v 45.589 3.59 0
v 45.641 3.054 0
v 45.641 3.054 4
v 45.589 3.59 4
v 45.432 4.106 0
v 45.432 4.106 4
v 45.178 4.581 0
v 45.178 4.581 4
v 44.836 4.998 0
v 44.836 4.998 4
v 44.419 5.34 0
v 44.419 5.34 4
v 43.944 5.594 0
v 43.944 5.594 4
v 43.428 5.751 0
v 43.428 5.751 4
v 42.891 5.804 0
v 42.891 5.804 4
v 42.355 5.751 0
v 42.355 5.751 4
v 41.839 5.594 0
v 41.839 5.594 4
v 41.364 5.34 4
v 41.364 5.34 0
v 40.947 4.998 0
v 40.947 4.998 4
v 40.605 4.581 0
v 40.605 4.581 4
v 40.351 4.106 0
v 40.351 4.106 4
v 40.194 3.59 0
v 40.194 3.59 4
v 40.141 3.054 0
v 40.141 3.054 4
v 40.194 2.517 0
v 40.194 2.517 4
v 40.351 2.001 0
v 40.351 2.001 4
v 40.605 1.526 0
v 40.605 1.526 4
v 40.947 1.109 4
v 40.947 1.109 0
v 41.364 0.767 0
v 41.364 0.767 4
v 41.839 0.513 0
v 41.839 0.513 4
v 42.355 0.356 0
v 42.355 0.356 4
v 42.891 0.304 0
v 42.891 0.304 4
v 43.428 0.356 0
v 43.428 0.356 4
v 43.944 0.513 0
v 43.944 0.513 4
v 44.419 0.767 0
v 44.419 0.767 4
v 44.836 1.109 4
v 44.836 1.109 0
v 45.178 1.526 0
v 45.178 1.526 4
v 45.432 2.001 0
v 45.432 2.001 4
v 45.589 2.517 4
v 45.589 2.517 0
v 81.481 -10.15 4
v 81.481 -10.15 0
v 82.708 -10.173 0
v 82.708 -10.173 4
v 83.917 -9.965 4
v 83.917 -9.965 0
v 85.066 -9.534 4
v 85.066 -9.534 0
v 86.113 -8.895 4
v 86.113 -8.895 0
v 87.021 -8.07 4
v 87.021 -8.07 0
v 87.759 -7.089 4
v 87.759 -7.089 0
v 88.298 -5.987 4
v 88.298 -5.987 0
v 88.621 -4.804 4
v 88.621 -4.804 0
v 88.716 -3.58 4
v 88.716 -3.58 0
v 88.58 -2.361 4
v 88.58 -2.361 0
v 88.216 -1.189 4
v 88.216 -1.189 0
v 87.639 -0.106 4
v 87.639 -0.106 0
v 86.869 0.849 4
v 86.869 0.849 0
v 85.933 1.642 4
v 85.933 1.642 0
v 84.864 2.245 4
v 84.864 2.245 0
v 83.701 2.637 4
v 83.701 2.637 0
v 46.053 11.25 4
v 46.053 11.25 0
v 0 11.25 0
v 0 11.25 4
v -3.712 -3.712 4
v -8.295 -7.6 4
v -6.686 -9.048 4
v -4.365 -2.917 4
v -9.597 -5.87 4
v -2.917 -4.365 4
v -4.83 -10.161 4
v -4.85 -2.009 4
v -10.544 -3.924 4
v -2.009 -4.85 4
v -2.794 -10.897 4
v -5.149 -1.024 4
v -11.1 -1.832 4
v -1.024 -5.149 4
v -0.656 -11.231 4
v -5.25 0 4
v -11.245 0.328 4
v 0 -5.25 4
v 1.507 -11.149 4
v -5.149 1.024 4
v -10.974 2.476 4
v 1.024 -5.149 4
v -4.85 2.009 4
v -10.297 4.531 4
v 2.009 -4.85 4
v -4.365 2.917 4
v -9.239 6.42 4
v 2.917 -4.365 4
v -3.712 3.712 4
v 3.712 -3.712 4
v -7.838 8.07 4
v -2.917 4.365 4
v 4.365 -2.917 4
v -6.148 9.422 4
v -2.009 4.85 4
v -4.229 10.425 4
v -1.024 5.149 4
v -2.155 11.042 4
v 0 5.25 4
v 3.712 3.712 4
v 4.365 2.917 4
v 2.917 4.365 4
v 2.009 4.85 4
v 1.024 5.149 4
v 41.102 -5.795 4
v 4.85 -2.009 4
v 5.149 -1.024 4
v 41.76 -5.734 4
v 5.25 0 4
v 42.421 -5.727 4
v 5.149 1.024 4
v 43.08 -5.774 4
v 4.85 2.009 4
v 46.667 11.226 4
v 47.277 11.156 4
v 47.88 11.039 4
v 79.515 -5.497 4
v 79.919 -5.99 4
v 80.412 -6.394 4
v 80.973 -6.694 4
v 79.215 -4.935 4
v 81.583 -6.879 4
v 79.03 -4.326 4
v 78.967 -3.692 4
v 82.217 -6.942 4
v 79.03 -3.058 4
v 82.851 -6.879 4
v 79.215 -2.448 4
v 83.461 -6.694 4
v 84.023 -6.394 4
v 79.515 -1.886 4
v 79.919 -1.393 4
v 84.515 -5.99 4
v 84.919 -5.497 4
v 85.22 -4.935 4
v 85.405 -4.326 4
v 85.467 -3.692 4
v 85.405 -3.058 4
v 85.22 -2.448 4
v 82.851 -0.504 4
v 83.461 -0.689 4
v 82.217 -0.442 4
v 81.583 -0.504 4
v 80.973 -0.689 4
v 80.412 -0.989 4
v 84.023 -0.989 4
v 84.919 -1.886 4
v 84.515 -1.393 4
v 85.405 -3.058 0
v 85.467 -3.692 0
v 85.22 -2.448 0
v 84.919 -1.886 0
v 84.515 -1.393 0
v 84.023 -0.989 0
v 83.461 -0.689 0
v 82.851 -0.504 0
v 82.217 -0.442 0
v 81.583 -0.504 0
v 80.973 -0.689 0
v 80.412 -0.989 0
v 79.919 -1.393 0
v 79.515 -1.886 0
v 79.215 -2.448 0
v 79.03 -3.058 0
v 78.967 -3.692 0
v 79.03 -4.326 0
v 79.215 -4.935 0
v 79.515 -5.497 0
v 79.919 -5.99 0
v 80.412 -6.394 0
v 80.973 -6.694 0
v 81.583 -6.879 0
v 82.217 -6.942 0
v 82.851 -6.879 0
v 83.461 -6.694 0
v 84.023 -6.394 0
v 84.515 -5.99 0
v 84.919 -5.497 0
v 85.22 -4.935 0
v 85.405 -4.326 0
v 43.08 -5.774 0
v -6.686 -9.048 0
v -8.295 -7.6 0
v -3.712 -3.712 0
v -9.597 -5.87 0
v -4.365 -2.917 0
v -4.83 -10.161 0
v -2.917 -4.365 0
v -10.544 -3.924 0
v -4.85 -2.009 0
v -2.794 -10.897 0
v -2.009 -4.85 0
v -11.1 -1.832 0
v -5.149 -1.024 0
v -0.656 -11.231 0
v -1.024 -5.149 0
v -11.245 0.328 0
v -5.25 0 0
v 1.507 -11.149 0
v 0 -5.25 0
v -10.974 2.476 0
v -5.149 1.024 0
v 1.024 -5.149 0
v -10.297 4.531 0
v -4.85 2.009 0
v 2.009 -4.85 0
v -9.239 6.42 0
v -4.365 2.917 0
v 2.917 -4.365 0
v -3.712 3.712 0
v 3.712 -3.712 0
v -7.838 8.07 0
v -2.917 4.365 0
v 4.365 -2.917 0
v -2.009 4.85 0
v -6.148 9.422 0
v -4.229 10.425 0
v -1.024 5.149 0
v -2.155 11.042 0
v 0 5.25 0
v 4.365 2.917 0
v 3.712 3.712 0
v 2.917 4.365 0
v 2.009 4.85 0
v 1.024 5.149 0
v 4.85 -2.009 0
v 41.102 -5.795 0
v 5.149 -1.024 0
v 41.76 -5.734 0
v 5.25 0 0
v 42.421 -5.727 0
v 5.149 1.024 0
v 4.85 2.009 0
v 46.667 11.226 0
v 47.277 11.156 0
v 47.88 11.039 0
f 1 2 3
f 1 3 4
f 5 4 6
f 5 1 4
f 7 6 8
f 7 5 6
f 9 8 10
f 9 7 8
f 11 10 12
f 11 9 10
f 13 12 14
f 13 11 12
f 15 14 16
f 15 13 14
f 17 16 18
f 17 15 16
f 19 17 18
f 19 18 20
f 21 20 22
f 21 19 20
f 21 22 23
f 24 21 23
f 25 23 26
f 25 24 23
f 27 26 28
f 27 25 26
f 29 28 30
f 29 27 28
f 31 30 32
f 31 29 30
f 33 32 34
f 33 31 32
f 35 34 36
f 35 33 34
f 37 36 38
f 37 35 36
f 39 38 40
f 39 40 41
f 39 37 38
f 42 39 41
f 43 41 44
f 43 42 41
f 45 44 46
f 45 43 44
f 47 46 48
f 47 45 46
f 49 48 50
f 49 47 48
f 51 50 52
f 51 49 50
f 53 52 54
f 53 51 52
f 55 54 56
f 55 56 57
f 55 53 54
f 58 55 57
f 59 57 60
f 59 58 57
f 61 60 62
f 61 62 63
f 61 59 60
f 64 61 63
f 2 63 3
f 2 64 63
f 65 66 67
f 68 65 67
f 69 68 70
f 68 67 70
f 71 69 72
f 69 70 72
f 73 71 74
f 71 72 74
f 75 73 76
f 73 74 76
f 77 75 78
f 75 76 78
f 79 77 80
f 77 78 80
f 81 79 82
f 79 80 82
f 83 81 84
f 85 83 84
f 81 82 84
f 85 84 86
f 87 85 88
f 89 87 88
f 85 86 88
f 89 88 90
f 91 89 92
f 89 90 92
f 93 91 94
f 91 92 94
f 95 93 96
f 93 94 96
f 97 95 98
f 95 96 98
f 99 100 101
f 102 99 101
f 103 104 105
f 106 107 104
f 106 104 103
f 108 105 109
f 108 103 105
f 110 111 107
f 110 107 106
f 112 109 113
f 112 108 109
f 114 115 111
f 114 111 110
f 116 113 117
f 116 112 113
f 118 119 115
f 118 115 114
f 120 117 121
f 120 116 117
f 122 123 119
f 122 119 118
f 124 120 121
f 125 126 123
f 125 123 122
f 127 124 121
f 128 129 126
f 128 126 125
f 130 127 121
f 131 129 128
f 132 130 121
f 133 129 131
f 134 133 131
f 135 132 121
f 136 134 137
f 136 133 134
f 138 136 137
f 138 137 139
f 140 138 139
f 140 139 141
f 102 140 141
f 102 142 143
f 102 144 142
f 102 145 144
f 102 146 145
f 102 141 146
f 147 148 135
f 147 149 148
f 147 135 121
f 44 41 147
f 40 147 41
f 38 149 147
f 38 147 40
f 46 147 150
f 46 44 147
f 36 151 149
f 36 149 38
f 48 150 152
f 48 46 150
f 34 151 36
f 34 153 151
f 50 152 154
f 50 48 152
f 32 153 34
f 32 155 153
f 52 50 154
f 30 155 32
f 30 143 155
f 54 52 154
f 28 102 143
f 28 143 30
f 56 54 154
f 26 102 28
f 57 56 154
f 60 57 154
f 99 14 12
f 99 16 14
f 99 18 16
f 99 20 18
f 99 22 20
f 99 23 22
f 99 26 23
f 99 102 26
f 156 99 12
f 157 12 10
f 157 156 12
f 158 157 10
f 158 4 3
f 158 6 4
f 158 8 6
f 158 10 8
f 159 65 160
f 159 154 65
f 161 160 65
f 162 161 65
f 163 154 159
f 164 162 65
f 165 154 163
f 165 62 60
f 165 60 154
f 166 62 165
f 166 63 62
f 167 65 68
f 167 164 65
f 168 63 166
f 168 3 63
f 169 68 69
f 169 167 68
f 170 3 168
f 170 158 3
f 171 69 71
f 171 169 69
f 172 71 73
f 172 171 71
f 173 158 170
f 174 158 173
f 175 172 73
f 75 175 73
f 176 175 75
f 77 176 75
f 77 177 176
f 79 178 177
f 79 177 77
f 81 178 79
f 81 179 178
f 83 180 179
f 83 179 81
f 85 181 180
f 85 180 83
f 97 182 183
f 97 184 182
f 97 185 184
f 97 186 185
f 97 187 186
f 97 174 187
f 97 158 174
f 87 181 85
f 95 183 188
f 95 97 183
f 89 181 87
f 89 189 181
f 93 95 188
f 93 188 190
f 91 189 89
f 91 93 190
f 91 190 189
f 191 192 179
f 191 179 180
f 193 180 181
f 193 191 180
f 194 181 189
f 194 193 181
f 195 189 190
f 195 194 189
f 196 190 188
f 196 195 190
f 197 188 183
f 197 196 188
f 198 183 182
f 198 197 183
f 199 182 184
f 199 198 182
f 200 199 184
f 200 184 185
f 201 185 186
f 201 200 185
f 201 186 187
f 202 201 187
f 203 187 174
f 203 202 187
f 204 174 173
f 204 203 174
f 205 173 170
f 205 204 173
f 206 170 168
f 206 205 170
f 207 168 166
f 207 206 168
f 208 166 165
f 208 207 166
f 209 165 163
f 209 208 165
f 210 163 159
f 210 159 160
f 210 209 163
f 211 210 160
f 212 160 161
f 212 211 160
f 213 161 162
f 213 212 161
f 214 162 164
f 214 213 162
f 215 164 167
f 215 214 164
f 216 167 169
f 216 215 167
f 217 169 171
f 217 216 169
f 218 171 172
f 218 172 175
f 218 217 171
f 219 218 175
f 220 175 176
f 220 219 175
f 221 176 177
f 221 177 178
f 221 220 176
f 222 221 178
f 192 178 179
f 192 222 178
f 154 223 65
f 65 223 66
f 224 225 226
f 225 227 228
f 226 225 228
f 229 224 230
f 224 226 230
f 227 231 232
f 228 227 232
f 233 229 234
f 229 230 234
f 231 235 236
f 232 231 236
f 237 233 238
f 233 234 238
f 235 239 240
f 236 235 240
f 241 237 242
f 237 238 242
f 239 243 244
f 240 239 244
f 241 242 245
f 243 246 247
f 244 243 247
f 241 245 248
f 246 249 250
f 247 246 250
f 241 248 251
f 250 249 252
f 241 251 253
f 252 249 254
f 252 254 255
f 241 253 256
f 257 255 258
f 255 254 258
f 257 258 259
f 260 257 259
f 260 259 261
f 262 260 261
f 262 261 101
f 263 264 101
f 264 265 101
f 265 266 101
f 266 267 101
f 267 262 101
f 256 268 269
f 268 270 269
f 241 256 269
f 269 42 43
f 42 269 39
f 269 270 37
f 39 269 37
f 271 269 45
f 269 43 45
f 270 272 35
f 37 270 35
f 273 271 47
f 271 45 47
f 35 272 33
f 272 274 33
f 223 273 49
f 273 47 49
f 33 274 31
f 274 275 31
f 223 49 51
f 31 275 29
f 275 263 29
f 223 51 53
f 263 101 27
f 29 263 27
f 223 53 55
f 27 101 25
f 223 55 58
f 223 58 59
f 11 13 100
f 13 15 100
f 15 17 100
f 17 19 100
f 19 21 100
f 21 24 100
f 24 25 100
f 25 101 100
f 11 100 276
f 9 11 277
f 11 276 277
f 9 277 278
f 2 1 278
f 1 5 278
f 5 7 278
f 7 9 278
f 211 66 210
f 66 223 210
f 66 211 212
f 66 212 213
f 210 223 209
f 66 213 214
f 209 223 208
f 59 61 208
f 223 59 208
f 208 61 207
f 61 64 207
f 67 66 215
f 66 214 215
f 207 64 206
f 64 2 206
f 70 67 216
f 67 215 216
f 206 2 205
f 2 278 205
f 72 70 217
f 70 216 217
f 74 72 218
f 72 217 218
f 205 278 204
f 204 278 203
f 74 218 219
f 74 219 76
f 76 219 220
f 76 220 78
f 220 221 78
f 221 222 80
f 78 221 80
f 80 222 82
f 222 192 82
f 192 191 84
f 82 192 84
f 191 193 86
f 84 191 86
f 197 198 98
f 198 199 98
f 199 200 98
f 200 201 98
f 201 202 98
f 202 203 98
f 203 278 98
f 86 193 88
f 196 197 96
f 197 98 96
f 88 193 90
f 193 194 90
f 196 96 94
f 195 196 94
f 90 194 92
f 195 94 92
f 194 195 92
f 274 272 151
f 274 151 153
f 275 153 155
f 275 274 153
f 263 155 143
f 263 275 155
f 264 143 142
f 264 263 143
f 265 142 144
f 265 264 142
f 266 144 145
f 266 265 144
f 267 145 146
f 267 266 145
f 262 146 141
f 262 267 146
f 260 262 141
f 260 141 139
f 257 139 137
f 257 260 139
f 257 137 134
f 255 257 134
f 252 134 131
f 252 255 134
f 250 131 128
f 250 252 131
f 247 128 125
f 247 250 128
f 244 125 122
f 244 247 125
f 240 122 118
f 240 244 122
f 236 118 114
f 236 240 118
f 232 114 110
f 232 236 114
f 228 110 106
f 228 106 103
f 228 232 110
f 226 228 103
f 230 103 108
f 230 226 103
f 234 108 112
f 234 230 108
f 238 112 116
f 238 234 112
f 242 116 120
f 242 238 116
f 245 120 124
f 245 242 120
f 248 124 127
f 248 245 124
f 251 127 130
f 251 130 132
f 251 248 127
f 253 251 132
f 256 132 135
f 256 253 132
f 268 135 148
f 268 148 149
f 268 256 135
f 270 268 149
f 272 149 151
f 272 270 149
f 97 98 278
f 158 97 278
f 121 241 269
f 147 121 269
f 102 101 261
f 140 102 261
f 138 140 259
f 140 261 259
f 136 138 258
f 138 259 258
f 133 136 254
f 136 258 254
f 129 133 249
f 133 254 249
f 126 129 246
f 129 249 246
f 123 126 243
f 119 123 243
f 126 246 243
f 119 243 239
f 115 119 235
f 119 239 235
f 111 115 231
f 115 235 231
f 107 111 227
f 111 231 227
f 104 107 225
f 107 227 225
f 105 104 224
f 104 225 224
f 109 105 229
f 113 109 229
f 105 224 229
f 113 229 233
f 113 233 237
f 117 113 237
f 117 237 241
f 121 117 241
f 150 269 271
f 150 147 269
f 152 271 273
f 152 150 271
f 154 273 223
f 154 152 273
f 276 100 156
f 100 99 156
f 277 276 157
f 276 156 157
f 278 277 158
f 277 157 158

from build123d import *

# Parameters (mm, degrees)
F0_R     = 5.25
F0_R_2   = 3.25
F0_R_3   = 2.75
F1_DEPTH = 4
F2_R     = 8


with BuildPart() as f1:
    # F0 (on Top) → F1 (new body)
    with BuildSketch(Plane.XY):
        with BuildLine():
            Line((46.978489, 11.25), (0, 11.25))
            ThreePointArc((0, 11.25), (-11.224612, -0.755377), (1.507345, -11.148561))
            Line((1.507345, -11.148561), (42.089501, -5.661638))
            Line((42.089501, -5.661638), (81.481345, -10.149772))
            ThreePointArc((81.481345, -10.149772), (88.62135, -4.803506), (83.701447, 2.636708))
            Line((83.701447, 2.636708), (46.978489, 11.25))
        make_face()
        Circle(F0_R, mode=Mode.SUBTRACT)
        with Locations((82.217166, -3.691555)):
            Circle(F0_R_2, mode=Mode.SUBTRACT)
        with Locations((42.891439, 3.053603)):
            Circle(F0_R_3, mode=Mode.SUBTRACT)
    extrude(amount=F1_DEPTH)

    # F2
    f2_edges = [f1.edges().sort_by_distance(p)[0] for p in [
        (42.089501, -5.661638, 2),
        (46.978489, 11.25, 2),
    ]]
    fillet(f2_edges, radius=F2_R)


solid = f1.part
